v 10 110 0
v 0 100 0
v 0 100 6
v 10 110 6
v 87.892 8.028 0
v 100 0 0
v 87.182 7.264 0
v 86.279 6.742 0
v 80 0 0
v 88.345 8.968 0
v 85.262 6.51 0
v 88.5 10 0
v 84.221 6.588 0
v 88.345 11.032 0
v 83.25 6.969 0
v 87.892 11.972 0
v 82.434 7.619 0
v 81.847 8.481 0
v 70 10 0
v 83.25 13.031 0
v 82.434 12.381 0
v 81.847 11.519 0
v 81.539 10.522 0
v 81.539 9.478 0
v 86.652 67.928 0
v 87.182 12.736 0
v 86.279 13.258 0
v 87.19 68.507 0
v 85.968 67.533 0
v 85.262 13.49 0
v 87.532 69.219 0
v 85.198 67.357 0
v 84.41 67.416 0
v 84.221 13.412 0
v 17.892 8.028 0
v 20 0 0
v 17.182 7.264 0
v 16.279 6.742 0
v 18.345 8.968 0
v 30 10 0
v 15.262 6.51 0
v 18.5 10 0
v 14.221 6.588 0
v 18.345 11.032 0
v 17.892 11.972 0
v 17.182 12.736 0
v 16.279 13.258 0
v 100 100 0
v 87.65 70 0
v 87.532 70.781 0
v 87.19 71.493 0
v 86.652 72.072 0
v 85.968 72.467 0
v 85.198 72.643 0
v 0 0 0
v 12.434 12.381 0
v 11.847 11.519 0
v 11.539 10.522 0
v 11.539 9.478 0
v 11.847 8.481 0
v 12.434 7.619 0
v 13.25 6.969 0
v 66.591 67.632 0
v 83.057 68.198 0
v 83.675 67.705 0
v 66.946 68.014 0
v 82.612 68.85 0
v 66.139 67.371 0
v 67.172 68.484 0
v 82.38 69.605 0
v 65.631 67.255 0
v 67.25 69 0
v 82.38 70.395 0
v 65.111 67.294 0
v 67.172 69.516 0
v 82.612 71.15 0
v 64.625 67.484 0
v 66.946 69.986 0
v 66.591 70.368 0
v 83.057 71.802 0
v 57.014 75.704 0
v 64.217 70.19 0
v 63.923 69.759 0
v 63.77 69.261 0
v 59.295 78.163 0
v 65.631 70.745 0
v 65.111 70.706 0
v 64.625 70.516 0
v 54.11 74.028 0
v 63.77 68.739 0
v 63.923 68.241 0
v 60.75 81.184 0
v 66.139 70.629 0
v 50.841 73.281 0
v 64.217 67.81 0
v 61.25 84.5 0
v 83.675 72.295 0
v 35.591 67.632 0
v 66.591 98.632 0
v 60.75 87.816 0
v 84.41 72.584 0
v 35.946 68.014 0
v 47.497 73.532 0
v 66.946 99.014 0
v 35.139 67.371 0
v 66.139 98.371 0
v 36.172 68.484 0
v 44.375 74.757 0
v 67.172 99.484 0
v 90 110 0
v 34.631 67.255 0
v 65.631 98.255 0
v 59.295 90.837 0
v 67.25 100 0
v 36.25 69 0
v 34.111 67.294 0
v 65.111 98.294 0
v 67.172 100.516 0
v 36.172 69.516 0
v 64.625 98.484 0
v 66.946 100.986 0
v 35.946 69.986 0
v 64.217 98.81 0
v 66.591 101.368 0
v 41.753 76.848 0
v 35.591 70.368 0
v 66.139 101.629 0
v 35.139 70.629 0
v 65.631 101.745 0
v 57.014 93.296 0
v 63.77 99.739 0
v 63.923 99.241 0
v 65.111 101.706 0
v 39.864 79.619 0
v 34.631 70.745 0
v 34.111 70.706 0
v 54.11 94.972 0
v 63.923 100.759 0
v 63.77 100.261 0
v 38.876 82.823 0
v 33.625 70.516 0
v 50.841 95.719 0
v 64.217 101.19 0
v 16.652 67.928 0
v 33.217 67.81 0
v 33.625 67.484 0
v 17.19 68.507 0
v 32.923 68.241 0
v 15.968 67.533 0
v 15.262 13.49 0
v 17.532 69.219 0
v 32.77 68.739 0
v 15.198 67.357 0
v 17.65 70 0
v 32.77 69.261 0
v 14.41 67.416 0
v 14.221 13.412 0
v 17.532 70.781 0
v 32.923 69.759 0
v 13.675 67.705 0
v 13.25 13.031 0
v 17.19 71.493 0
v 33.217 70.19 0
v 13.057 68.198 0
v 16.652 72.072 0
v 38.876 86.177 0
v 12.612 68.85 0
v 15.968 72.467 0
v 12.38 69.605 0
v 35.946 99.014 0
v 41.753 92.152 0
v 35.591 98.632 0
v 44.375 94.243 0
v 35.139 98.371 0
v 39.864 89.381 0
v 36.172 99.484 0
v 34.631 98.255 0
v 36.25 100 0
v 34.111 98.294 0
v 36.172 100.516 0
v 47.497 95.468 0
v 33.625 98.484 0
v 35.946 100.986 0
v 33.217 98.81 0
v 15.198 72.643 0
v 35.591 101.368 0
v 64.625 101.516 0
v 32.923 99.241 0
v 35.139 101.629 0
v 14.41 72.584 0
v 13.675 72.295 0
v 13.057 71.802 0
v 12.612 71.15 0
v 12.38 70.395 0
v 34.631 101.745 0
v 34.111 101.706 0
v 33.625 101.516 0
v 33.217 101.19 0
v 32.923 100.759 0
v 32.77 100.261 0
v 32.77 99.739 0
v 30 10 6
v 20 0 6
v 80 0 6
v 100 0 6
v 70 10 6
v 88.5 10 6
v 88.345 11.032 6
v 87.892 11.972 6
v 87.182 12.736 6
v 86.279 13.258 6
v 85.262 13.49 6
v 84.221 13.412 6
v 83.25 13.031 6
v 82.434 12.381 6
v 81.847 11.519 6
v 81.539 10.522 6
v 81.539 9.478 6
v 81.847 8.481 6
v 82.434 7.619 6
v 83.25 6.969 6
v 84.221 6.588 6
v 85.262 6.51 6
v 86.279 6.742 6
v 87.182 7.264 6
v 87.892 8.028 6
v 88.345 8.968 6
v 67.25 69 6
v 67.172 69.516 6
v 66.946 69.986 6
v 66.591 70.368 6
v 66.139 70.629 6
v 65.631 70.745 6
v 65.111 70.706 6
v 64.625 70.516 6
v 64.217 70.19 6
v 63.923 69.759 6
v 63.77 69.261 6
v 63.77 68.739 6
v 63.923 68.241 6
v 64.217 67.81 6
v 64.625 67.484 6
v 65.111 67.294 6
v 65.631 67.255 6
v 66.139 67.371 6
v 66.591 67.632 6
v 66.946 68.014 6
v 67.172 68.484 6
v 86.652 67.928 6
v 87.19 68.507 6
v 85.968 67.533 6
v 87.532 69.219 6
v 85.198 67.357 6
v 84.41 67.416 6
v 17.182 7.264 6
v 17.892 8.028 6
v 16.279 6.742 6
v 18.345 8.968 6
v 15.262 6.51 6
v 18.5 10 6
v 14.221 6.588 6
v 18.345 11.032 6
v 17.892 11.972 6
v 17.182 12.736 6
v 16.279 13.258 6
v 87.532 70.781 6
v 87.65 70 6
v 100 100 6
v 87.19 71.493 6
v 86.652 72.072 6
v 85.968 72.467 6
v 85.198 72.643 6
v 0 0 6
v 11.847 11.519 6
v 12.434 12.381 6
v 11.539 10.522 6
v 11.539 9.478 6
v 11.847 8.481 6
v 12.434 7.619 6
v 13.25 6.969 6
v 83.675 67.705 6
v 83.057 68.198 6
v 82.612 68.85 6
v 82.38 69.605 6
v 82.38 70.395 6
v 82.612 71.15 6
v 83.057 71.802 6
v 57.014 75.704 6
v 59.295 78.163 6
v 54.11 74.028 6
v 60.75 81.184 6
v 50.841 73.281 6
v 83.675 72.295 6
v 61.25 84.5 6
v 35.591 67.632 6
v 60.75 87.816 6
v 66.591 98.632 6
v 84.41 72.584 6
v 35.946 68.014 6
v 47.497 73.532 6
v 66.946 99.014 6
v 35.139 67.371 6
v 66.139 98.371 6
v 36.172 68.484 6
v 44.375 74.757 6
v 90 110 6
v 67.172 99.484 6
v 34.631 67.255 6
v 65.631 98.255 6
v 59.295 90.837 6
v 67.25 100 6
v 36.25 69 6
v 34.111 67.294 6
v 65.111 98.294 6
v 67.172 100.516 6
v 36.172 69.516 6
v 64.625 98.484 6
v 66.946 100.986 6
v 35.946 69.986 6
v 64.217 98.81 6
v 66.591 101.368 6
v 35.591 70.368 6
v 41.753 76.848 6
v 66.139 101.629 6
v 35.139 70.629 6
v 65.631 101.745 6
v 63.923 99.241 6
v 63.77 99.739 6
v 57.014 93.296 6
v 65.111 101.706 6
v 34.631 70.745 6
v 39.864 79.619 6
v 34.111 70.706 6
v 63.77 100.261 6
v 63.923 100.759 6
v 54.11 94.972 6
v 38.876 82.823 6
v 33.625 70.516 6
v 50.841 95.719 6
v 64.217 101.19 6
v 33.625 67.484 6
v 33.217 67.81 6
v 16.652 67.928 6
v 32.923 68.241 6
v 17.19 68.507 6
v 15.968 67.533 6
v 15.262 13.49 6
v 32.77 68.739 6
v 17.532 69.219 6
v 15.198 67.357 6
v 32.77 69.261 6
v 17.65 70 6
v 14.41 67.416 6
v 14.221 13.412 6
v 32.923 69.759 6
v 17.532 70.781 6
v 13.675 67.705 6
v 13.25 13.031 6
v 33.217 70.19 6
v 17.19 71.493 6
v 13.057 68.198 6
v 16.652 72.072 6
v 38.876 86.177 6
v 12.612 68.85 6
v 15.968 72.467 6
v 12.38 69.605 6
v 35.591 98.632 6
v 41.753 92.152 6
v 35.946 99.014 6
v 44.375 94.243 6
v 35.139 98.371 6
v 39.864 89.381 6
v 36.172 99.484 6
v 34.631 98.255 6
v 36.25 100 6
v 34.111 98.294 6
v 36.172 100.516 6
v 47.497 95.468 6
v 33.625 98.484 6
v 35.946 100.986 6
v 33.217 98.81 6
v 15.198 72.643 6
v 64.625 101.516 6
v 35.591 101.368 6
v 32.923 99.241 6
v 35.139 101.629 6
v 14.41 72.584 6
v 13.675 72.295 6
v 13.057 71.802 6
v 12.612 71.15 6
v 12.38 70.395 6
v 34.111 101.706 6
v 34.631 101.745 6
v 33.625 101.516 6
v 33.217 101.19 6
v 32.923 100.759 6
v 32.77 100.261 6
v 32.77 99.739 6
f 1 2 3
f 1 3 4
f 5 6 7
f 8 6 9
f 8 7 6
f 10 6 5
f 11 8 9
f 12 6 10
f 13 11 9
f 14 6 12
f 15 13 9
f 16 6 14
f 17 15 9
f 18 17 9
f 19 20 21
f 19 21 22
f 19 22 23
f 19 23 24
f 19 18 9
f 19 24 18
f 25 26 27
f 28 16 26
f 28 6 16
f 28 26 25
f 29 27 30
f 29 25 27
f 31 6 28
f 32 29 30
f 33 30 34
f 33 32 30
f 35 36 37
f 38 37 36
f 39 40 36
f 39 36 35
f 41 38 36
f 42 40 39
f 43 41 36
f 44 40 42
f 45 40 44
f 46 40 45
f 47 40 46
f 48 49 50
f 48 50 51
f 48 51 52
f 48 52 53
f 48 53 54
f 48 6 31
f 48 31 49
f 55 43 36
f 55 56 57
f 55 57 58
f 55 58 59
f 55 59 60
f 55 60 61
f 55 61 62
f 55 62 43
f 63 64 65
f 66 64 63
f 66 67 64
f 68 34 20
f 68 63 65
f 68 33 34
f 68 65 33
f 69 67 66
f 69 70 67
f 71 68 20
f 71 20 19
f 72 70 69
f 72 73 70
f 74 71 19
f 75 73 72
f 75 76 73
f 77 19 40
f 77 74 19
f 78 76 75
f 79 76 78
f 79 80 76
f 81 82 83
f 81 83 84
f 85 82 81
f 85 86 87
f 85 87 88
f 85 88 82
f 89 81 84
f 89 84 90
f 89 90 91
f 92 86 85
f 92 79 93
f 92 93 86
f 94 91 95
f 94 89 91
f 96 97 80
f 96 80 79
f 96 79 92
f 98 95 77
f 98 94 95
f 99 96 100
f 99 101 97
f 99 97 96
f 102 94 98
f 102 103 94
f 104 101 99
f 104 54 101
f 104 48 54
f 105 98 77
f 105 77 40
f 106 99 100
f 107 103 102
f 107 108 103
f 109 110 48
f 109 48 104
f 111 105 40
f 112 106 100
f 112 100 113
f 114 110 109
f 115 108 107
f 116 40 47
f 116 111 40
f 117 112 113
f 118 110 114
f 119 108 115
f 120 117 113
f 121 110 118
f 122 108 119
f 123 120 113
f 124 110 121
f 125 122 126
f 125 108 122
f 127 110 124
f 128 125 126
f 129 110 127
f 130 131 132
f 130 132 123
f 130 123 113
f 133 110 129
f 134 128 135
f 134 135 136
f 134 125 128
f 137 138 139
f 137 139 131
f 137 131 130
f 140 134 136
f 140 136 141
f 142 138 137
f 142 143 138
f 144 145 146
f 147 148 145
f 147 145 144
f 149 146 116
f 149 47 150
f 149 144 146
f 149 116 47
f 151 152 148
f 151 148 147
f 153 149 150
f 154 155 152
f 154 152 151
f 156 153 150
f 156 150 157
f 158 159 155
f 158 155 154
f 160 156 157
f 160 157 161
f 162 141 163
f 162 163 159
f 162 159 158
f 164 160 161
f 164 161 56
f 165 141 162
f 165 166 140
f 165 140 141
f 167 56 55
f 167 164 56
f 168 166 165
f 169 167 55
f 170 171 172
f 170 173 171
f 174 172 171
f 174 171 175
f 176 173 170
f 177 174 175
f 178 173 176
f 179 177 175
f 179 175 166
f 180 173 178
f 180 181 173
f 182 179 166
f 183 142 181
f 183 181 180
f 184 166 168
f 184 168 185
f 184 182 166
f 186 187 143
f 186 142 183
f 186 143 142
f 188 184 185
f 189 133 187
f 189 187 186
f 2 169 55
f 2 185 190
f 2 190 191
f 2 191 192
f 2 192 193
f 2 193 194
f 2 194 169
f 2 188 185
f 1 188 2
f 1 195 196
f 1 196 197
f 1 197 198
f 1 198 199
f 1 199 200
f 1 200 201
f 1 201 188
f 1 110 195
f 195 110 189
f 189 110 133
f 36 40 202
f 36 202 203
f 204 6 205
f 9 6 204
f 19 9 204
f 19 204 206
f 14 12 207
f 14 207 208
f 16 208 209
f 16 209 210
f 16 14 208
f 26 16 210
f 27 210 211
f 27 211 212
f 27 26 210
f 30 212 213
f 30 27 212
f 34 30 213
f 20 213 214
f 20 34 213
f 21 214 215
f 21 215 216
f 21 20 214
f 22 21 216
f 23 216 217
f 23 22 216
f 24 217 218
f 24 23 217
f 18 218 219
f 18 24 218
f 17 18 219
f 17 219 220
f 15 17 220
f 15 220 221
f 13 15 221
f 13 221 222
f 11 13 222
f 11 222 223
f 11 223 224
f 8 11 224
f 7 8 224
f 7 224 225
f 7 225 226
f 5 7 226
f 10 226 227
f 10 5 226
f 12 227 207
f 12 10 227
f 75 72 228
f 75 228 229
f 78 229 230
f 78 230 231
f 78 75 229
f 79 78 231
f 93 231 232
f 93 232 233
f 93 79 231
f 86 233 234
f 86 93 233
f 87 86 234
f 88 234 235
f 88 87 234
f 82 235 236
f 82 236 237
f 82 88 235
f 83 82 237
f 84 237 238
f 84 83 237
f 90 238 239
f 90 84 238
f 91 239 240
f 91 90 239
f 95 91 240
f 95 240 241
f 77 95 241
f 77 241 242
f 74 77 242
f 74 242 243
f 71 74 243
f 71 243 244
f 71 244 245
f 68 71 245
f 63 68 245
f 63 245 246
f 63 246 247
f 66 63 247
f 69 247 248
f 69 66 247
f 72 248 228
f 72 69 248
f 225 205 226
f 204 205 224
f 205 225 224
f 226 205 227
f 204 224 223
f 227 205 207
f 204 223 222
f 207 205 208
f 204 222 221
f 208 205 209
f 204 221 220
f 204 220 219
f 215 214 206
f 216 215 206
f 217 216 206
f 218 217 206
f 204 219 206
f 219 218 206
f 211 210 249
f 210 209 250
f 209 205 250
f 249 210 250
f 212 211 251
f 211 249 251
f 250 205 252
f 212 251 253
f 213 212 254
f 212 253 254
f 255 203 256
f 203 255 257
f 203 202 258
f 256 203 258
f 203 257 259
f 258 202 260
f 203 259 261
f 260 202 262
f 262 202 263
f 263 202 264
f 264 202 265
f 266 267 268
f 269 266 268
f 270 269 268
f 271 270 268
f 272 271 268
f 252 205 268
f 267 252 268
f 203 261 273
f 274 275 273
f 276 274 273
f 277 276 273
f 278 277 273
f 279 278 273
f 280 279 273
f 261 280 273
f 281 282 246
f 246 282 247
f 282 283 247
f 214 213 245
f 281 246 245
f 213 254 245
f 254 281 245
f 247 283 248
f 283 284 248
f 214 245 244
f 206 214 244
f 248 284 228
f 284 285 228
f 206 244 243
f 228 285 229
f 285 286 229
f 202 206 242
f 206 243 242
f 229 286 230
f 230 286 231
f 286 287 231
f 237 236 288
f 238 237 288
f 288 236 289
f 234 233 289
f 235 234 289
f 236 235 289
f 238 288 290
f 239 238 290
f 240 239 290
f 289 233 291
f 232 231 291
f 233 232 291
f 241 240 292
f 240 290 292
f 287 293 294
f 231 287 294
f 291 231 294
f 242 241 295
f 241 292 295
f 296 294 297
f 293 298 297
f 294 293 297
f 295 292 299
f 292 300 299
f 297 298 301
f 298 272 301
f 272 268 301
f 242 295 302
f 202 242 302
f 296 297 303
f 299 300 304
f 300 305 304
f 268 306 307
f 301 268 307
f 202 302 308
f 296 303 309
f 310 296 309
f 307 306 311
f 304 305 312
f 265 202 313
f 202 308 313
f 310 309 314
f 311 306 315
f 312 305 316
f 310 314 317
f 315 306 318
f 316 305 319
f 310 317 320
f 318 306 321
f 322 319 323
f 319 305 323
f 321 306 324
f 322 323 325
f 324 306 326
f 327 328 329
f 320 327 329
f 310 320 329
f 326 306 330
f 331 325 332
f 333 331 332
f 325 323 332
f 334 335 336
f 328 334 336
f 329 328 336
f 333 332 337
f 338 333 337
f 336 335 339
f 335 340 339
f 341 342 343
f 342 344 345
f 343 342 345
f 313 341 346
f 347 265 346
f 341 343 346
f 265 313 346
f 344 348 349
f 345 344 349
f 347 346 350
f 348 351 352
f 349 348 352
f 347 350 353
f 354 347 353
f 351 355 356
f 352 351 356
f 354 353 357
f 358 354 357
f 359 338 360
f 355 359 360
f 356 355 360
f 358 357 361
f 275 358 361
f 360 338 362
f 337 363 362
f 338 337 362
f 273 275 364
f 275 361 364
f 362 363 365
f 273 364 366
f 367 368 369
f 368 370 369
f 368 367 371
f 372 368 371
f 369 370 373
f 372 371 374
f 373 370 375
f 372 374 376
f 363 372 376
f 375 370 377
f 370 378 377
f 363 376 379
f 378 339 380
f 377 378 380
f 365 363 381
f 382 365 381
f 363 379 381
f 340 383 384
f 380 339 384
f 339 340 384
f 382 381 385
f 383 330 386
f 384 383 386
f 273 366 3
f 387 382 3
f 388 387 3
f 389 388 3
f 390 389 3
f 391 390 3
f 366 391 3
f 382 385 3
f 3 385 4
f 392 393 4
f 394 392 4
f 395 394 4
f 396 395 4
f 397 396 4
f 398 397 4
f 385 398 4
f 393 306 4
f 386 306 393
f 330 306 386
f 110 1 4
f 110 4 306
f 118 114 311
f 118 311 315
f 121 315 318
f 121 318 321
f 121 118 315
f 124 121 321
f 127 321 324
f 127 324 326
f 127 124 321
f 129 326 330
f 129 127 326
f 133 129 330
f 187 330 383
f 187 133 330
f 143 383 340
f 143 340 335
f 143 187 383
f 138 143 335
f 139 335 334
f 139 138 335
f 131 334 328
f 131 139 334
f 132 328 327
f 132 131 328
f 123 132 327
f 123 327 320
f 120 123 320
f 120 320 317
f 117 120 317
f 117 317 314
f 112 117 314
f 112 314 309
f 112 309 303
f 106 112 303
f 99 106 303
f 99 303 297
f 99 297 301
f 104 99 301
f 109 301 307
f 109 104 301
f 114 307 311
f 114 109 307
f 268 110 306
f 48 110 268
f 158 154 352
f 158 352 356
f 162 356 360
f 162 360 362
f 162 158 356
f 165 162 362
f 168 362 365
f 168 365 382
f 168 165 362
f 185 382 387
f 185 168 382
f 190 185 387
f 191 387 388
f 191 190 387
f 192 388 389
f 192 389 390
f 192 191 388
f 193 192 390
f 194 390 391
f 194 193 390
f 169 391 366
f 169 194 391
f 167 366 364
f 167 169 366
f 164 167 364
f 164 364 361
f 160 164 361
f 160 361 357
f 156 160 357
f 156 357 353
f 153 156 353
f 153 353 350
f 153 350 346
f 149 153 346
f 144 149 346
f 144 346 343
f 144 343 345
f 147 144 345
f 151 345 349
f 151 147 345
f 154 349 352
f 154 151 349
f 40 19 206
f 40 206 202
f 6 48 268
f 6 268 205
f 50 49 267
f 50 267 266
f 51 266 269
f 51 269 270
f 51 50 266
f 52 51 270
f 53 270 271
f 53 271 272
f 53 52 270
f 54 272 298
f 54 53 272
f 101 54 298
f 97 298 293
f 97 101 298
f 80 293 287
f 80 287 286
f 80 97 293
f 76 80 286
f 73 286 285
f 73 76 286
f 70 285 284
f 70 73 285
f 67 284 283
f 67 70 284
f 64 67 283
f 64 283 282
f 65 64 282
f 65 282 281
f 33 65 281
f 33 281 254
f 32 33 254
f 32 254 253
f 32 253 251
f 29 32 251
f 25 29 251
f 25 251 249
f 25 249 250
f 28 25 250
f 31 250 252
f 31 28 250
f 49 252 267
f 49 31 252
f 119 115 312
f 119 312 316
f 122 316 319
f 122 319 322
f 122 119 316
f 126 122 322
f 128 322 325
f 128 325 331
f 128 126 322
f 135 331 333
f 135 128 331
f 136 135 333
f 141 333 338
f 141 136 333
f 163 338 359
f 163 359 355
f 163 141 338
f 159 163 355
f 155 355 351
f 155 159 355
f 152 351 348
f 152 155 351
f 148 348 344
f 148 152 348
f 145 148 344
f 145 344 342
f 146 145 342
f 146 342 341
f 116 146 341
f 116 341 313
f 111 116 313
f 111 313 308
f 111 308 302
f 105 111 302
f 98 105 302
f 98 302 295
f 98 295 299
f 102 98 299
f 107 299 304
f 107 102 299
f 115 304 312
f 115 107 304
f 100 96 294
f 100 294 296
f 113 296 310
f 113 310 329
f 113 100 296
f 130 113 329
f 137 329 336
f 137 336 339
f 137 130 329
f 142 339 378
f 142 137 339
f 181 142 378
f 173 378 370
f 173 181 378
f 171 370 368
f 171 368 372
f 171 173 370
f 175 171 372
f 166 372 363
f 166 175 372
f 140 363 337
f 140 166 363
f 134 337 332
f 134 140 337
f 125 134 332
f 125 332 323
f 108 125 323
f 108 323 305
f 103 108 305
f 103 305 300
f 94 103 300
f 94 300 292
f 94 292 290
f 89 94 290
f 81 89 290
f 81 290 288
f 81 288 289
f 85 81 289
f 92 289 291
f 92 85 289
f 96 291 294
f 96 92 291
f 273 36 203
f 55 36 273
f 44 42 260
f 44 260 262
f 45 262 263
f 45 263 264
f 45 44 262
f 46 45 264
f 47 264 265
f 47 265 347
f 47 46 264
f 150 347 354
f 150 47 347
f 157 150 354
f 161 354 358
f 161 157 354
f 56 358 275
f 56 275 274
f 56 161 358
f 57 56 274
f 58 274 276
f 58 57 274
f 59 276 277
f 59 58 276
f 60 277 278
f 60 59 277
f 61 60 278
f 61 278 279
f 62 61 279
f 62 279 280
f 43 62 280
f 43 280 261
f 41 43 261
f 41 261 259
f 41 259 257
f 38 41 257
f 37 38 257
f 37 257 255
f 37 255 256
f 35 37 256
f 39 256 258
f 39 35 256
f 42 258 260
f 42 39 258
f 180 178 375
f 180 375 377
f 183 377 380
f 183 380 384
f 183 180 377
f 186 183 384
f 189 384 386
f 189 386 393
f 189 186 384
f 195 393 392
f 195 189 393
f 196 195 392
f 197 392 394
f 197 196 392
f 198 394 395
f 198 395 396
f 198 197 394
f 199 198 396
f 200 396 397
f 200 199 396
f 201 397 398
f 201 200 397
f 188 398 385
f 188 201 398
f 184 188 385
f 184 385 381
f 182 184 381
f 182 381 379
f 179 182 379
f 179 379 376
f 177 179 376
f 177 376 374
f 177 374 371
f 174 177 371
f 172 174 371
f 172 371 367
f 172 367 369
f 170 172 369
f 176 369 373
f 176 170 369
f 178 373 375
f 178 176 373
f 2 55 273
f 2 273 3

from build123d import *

# Parameters (mm, degrees)
CROQUIS1_R              = 2.65
CROQUIS1_R_2            = 3.5
CROQUIS1_R_3            = 1.75
CROQUIS1_R_4            = 11.25
SALIENTE_EXTRUIR1_DEPTH = 6


with BuildPart() as part:
    # Croquis1 → Saliente-Extruir1 (new body)
    with BuildSketch(Plane.XY):
        Polygon((100, 100), (100, 0), (80, 0), (70, 10), (30, 10), (20, 0), (0, 0), (0, 100), (10, 110), (90, 110), align=None)
        with Locations((15, 70)):
            Circle(CROQUIS1_R, mode=Mode.SUBTRACT)
        with Locations((15, 10)):
            Circle(CROQUIS1_R_2, mode=Mode.SUBTRACT)
        with Locations((85, 10)):
            Circle(CROQUIS1_R_2, mode=Mode.SUBTRACT)
        with Locations((34.5, 100)):
            Circle(CROQUIS1_R_3, mode=Mode.SUBTRACT)
        with Locations((65.5, 100)):
            Circle(CROQUIS1_R_3, mode=Mode.SUBTRACT)
        with Locations((65.5, 69)):
            Circle(CROQUIS1_R_3, mode=Mode.SUBTRACT)
        with Locations((34.5, 69)):
            Circle(CROQUIS1_R_3, mode=Mode.SUBTRACT)
        with Locations((50, 84.5)):
            Circle(CROQUIS1_R_4, mode=Mode.SUBTRACT)
        with Locations((85, 70)):
            Circle(CROQUIS1_R, mode=Mode.SUBTRACT)
    extrude(amount=SALIENTE_EXTRUIR1_DEPTH)


solid = part.part
